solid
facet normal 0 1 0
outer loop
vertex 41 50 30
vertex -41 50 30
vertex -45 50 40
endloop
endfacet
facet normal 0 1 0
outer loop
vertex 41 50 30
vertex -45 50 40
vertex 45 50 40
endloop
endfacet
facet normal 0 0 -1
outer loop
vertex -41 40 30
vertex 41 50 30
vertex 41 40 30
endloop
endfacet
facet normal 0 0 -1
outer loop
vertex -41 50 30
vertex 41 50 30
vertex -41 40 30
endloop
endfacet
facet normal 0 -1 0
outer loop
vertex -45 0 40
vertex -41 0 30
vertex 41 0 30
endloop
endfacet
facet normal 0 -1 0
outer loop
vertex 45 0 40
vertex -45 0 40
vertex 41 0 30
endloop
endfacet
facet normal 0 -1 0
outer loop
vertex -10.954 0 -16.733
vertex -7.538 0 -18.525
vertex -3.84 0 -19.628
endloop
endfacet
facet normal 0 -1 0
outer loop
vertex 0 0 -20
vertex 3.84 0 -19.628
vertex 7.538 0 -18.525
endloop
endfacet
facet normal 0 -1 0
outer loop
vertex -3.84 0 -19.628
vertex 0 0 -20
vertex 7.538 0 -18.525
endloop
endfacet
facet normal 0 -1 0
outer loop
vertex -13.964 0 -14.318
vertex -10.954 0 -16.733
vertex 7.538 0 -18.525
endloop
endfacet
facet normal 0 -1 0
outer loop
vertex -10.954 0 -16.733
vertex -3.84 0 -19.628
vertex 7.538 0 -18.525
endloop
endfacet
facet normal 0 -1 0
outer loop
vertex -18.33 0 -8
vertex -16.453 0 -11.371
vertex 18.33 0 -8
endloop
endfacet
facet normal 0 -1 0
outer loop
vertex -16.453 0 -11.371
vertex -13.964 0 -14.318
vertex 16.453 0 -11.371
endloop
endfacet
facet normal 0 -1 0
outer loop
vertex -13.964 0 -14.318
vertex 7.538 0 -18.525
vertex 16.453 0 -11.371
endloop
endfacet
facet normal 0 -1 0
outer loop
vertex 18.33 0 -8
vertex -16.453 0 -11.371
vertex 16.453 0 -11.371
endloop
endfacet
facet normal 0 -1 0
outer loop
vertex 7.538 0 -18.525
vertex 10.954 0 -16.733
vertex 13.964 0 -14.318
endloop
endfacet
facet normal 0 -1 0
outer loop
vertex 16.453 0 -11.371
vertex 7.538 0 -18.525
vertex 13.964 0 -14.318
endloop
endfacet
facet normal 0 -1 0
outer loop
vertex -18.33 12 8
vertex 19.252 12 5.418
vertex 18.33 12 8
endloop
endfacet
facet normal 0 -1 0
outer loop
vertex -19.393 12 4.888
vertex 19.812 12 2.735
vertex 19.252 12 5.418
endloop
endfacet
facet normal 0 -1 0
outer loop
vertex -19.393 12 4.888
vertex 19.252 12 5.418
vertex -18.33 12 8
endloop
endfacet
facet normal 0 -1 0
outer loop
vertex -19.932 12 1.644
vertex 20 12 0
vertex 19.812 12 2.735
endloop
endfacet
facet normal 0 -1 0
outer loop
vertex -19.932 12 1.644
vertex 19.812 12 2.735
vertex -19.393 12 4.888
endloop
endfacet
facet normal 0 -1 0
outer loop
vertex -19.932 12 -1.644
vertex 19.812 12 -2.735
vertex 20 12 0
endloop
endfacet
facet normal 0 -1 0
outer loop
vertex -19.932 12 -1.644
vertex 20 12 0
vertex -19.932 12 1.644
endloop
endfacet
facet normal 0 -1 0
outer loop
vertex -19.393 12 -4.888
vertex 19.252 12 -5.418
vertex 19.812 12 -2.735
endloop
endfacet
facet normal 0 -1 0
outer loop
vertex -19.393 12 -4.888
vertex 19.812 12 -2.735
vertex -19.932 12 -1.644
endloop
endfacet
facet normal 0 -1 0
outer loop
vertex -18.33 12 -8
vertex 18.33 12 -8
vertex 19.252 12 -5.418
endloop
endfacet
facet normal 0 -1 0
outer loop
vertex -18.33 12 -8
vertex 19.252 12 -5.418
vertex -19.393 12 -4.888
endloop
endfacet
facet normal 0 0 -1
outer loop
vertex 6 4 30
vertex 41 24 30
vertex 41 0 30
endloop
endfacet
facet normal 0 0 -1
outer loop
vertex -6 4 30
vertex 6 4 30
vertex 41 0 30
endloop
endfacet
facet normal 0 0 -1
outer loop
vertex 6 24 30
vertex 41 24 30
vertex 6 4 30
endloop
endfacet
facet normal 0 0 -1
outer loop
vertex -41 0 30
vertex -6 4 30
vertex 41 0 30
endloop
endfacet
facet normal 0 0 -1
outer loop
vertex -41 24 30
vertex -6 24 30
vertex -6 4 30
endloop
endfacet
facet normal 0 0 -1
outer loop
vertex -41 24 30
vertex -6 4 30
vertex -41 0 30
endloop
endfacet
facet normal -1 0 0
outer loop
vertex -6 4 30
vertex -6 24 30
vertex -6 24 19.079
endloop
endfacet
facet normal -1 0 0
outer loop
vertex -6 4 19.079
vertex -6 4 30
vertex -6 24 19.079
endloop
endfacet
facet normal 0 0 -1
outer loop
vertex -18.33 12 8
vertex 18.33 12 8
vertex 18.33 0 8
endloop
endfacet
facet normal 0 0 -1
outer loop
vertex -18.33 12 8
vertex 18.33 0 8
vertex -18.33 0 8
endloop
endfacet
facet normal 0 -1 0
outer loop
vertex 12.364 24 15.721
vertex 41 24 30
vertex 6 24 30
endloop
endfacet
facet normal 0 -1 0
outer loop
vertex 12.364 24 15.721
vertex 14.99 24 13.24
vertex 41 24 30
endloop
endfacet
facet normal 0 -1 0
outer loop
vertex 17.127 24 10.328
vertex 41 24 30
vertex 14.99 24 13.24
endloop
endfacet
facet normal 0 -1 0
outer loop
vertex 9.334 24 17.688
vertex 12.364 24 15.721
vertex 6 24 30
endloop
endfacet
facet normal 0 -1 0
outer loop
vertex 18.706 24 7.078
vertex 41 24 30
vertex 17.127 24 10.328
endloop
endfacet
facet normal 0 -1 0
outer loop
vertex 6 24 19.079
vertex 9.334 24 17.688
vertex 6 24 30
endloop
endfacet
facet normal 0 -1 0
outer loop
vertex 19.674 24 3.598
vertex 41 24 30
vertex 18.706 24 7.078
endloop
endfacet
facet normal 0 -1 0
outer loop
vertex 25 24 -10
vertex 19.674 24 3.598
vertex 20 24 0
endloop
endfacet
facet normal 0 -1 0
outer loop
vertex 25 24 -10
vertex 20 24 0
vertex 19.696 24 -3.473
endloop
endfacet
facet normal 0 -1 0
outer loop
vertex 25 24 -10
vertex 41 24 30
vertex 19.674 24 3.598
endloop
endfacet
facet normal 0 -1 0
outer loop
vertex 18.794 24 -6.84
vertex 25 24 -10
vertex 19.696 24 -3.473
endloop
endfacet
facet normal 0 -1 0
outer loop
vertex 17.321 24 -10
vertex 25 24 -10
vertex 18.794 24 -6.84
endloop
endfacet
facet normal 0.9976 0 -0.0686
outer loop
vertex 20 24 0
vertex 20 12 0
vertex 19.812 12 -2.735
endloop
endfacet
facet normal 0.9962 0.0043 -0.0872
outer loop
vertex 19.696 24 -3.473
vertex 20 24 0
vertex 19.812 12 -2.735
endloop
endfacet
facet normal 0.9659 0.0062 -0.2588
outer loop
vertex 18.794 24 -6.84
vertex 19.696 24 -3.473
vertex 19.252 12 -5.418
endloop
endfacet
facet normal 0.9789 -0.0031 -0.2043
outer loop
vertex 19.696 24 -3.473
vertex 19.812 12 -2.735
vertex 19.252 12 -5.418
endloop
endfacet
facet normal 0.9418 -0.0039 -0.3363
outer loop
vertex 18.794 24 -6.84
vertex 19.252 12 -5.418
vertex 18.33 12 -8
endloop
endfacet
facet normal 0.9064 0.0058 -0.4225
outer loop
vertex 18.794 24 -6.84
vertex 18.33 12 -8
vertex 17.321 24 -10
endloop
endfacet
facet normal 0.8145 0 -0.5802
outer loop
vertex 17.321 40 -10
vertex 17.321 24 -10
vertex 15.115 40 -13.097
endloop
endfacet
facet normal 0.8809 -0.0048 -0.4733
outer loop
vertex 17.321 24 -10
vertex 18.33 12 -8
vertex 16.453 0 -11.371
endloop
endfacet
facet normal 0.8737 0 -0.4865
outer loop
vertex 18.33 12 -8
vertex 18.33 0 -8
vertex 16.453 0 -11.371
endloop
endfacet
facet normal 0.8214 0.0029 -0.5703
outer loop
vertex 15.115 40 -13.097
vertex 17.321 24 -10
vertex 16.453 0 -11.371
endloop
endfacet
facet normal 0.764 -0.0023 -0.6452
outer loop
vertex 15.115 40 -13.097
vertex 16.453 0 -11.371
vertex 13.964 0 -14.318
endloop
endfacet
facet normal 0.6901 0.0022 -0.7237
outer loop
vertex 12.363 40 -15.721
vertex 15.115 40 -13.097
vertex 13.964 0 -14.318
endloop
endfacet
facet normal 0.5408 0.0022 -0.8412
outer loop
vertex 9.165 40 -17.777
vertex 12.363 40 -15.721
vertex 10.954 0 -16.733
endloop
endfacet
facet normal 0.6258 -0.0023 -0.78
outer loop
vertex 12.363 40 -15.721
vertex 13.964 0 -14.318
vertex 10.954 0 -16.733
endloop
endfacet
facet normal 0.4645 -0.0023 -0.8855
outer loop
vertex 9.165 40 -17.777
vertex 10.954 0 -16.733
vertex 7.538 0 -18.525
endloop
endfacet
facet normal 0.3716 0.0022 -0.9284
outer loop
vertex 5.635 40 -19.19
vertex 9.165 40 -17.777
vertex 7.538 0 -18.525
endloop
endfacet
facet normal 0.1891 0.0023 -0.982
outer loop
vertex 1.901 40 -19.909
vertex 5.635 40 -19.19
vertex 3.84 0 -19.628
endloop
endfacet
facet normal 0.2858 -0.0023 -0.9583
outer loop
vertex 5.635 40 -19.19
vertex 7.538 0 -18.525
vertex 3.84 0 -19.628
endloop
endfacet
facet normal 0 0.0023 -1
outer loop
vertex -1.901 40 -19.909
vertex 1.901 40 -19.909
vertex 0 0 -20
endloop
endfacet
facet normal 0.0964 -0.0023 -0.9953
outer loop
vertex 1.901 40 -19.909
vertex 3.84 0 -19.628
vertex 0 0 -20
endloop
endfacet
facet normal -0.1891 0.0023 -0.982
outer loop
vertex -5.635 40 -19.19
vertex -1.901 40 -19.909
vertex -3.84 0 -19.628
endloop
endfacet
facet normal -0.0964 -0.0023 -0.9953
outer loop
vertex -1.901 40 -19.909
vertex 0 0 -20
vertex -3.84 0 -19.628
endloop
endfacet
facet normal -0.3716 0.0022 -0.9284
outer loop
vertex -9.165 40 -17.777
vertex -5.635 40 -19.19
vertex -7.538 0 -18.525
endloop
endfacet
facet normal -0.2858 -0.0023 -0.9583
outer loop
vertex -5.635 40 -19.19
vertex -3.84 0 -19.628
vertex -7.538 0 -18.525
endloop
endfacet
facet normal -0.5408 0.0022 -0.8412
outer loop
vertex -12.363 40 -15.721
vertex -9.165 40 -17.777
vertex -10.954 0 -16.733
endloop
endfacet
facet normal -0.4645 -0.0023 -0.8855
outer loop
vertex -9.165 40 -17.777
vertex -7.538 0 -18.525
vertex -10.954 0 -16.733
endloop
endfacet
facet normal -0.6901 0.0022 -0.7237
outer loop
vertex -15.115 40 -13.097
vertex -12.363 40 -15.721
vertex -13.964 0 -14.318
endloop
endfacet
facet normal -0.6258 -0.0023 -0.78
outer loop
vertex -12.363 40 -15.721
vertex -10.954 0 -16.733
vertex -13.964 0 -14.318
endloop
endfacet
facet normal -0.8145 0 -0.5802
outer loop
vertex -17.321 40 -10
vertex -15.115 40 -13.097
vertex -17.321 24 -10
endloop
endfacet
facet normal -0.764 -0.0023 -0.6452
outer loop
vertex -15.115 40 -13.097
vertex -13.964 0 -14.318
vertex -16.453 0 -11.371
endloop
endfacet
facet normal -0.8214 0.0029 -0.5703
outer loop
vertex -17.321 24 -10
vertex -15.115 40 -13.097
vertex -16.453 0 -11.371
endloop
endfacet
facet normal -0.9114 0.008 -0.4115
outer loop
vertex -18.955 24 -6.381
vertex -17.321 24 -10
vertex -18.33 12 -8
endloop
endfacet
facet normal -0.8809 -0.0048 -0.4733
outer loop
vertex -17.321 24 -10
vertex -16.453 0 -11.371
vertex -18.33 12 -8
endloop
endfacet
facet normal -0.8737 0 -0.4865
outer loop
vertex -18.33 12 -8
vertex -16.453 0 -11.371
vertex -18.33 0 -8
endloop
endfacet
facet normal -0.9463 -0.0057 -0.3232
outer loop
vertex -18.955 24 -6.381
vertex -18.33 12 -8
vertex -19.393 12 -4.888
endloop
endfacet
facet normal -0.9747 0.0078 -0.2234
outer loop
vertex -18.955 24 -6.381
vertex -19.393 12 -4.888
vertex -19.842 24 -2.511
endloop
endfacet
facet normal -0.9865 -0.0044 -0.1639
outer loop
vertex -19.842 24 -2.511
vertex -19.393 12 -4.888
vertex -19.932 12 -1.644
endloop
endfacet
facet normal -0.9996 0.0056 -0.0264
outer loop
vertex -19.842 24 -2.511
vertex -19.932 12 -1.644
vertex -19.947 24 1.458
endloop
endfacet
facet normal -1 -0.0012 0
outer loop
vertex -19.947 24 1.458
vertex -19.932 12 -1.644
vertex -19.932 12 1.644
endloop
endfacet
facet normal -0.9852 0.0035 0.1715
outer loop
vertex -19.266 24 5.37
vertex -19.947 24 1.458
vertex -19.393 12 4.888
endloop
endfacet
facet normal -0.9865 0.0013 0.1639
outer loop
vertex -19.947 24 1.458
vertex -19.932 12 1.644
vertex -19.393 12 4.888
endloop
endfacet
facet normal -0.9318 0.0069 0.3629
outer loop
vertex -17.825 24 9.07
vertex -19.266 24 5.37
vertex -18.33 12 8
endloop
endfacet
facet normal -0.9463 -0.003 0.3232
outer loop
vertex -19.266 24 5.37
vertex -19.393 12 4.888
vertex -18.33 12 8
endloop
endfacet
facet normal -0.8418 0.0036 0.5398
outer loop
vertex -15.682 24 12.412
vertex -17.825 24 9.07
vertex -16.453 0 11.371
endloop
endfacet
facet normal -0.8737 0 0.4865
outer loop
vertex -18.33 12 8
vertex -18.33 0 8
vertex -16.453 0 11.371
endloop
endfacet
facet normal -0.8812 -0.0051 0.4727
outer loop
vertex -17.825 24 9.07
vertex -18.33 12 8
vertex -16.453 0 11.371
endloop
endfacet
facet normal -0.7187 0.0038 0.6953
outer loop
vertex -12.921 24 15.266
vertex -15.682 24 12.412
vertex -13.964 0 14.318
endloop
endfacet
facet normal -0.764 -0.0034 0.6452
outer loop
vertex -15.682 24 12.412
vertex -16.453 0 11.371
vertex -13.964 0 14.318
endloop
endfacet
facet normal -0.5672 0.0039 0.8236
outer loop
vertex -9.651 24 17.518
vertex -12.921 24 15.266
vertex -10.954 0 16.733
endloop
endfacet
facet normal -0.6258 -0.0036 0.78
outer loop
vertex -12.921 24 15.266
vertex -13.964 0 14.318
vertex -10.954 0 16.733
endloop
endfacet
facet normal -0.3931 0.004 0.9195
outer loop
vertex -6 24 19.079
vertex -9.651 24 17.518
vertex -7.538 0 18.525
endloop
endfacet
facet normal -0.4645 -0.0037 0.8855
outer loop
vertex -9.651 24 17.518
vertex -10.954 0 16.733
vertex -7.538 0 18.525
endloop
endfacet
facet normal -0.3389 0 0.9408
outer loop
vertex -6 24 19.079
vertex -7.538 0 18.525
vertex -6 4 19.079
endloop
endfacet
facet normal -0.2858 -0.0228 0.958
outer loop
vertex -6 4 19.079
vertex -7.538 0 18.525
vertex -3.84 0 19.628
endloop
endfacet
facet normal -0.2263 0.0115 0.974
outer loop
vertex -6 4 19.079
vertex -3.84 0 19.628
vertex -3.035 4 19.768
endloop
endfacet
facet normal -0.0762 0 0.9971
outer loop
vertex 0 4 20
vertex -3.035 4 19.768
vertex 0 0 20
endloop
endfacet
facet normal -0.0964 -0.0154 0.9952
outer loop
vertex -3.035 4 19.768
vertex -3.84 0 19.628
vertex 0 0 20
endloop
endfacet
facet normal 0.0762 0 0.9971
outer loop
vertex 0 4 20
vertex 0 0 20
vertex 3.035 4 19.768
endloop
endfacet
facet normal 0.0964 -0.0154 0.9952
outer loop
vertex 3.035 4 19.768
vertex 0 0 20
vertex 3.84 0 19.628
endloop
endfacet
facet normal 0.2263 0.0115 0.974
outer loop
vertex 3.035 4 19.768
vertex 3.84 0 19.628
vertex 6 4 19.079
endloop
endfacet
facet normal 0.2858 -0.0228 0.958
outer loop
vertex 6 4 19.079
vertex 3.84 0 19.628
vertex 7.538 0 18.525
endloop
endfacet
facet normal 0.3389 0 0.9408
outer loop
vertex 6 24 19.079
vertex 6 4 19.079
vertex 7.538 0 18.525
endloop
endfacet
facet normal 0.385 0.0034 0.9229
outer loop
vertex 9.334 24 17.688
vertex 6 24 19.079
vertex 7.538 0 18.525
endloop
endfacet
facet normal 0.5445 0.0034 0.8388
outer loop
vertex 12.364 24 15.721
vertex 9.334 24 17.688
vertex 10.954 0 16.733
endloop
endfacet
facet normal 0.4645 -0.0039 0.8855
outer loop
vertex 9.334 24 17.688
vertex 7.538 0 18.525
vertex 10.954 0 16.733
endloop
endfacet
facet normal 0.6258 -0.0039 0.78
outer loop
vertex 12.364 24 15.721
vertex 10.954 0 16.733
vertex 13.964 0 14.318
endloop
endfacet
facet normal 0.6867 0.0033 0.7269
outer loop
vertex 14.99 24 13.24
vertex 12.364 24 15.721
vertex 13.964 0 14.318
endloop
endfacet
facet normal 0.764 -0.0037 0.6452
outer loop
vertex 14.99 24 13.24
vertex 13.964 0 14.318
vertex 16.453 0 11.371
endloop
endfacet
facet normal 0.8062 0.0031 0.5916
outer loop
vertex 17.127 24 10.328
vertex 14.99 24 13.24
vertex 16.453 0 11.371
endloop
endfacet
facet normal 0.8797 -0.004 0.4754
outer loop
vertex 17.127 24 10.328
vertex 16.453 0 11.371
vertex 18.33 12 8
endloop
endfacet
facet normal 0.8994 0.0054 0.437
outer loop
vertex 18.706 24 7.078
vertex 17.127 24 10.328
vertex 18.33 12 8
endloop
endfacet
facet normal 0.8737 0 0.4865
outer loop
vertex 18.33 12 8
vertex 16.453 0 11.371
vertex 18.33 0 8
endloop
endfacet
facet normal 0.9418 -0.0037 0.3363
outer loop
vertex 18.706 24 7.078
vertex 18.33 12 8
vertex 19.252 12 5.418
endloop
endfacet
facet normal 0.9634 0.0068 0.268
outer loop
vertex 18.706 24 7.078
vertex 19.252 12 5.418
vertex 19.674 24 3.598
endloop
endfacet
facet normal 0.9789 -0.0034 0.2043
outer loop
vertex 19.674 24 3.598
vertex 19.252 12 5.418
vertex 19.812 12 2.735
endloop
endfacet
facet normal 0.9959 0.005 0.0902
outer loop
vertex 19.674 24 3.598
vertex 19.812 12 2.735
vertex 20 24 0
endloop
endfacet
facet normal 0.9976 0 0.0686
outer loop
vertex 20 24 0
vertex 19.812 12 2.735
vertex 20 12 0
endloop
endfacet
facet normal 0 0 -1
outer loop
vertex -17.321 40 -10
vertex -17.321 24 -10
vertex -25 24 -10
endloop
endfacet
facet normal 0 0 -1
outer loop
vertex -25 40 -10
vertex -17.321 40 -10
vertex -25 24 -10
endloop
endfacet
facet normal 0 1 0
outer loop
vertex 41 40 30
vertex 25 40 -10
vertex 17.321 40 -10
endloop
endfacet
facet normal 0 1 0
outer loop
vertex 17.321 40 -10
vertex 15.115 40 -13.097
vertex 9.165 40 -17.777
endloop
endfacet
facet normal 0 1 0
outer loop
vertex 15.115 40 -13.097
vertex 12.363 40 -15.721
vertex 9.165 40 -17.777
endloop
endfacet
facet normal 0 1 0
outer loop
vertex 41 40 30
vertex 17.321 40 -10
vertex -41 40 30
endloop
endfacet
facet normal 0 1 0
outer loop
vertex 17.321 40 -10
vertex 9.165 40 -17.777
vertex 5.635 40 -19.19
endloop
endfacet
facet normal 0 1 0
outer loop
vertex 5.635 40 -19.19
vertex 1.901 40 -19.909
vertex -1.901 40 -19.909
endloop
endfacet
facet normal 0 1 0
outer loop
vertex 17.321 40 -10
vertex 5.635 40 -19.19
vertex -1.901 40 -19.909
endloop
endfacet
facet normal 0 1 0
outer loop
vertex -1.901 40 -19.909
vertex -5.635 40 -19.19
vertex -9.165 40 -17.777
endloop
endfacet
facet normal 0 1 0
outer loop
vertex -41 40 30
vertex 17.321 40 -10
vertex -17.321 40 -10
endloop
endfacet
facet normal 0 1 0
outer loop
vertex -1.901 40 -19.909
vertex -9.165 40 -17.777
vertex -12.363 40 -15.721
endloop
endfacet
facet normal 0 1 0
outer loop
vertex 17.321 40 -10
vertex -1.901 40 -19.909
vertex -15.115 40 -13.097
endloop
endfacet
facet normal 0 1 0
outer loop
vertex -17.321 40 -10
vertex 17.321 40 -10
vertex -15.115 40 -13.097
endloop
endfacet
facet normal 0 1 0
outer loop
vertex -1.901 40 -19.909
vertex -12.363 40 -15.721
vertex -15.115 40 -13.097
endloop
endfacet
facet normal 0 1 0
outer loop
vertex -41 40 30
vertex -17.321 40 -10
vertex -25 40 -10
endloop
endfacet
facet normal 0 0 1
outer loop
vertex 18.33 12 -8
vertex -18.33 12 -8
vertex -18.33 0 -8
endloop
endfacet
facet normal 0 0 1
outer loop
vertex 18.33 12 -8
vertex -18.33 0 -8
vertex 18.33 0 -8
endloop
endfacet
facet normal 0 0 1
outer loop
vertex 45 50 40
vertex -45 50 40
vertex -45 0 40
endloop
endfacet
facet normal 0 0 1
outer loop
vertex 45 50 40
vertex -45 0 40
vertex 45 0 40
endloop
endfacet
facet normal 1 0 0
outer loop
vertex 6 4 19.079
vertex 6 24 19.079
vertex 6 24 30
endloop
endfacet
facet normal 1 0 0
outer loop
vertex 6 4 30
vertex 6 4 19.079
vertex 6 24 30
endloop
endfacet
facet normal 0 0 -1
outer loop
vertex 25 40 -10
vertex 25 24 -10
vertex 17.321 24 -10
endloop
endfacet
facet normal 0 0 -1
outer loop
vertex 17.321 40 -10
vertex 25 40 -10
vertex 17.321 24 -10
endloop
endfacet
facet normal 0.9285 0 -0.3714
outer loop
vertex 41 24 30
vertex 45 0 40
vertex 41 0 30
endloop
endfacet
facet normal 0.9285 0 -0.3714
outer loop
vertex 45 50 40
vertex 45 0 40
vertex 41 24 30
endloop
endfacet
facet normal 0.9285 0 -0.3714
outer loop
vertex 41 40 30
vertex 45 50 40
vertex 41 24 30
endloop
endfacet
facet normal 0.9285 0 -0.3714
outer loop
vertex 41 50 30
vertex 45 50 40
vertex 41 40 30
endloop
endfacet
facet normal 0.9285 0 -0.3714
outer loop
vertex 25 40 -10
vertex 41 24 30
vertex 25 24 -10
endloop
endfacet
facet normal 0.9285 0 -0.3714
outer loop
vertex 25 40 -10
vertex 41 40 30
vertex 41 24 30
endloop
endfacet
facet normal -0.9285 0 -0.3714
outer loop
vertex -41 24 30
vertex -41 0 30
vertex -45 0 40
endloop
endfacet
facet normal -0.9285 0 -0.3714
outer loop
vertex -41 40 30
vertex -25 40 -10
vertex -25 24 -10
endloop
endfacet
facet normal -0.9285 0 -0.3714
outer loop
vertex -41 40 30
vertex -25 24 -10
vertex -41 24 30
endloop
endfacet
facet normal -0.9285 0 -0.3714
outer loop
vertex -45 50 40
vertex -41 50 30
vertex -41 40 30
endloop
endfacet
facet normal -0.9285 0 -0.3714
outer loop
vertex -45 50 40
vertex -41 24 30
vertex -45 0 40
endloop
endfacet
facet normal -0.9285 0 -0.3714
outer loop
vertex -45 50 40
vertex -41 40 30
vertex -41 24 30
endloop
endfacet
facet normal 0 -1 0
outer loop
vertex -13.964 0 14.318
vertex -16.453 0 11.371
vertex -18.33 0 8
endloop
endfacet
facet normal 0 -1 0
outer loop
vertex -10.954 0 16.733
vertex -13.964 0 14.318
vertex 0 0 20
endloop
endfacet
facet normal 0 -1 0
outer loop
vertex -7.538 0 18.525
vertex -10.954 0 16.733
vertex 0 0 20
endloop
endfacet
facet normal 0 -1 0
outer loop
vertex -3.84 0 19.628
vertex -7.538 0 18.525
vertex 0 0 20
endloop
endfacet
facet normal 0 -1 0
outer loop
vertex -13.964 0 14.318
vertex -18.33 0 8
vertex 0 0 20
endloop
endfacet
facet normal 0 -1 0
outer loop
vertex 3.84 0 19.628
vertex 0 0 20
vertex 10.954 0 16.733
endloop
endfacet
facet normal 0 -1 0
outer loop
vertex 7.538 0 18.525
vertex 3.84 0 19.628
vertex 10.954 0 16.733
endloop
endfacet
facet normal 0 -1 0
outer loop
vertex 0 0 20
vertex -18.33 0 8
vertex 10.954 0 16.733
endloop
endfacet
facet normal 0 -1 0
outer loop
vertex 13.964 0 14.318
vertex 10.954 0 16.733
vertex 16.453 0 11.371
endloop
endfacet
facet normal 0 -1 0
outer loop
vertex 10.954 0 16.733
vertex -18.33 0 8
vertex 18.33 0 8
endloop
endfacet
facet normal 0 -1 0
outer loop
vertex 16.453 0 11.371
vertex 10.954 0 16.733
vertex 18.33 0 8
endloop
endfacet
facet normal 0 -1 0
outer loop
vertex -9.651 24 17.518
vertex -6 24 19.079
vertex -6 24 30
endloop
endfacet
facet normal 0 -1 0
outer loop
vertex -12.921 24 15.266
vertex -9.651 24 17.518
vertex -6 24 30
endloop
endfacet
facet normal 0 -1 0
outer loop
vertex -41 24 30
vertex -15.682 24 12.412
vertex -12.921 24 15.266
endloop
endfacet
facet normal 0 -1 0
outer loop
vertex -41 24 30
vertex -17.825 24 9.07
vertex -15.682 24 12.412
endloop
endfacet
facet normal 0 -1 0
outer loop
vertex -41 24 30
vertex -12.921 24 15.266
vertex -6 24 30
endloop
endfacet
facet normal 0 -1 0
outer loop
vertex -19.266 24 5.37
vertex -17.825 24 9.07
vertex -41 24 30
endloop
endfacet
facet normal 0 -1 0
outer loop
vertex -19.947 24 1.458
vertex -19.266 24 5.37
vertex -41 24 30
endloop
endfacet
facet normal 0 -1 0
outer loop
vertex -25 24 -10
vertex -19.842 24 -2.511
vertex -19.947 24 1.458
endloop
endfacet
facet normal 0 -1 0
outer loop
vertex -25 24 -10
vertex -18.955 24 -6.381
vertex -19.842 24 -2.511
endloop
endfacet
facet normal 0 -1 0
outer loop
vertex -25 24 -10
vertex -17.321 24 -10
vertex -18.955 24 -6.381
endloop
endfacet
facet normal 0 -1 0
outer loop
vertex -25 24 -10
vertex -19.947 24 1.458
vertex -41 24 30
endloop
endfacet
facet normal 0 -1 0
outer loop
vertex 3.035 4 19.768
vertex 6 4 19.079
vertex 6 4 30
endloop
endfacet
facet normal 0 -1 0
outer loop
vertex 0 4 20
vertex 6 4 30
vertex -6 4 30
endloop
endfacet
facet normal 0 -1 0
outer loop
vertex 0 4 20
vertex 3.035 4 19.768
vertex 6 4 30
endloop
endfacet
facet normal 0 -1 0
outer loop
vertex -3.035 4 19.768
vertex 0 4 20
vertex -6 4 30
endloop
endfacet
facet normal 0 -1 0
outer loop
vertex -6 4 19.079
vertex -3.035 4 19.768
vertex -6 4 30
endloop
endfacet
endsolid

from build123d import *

# Parameters (mm, degrees)
SKETCH3_R           = 20
BOSS_EXTRUDE1_DEPTH = 40
BOSS_EXTRUDE2_START = -16
BOSS_EXTRUDE2_DEPTH = 16
BOSS_EXTRUDE3_START = -26
BOSS_EXTRUDE3_DEPTH = 50
BOSS_EXTRUDE4_START = 20
BOSS_EXTRUDE4_DEPTH = 20
CUT_EXTRUDE1_START  = 24
CUT_EXTRUDE1_DEPTH  = 12


with BuildPart() as part:
    # Sketch3 → Boss-Extrude1 (new body)
    with BuildSketch(Plane(origin=(0, 0, 0), x_dir=(1, 0, 0), z_dir=(0, 1, 0))):
        Circle(SKETCH3_R)
    extrude(amount=BOSS_EXTRUDE1_DEPTH)

    # Sketch4 → Boss-Extrude2 (add)
    with BuildSketch(Plane(origin=(0, 40, 0), x_dir=(1, 0, 0), z_dir=(0, 1, 0)).offset(BOSS_EXTRUDE2_START)):
        Polygon((25, 10), (45, -40), (-45, -40), (-25, 10), (-17.320508076, 10), (17.320508076, 10), align=None)
    extrude(amount=BOSS_EXTRUDE2_DEPTH)

    # Sketch6 → Boss-Extrude3 (add)
    with BuildSketch(Plane(origin=(0, 24, 0), x_dir=(-1, 0, 0), z_dir=(0, -1, 0)).offset(BOSS_EXTRUDE3_START)):
        Polygon((-41, -30), (41, -30), (45, -40), (-45, -40), align=None)
    extrude(amount=BOSS_EXTRUDE3_DEPTH)

    # Sketch7 → Boss-Extrude4 (add)
    with BuildSketch(Plane(origin=(0, 24, 0), x_dir=(-1, 0, 0), z_dir=(0, -1, 0)).offset(BOSS_EXTRUDE4_START)):
        with BuildLine():
            Line((-6, -19.078784028), (-6, -30))
            Line((-6, -30), (6, -30))
            Line((6, -30), (6, -19.078784028))
            ThreePointArc((6, -19.078784028), (0, -20), (-6, -19.078784028))
        make_face()
    extrude(amount=-BOSS_EXTRUDE4_DEPTH)

    # Sketch7<3> → Cut-Extrude1 (cut)
    with BuildSketch(Plane(origin=(0, 24, 0), x_dir=(-1, 0, 0), z_dir=(0, -1, 0)).offset(CUT_EXTRUDE1_START)):
        with BuildLine():
            ThreePointArc((-18.33030278, 8), (-20, 0), (-18.33030278, -8))
            Line((-18.33030278, -8), (18.33030278, -8))
            ThreePointArc((18.33030278, -8), (20, 0), (18.33030278, 8))
            Line((18.33030278, 8), (-18.33030278, 8))
        make_face()
    extrude(amount=-CUT_EXTRUDE1_DEPTH, mode=Mode.SUBTRACT)


solid = part.part
